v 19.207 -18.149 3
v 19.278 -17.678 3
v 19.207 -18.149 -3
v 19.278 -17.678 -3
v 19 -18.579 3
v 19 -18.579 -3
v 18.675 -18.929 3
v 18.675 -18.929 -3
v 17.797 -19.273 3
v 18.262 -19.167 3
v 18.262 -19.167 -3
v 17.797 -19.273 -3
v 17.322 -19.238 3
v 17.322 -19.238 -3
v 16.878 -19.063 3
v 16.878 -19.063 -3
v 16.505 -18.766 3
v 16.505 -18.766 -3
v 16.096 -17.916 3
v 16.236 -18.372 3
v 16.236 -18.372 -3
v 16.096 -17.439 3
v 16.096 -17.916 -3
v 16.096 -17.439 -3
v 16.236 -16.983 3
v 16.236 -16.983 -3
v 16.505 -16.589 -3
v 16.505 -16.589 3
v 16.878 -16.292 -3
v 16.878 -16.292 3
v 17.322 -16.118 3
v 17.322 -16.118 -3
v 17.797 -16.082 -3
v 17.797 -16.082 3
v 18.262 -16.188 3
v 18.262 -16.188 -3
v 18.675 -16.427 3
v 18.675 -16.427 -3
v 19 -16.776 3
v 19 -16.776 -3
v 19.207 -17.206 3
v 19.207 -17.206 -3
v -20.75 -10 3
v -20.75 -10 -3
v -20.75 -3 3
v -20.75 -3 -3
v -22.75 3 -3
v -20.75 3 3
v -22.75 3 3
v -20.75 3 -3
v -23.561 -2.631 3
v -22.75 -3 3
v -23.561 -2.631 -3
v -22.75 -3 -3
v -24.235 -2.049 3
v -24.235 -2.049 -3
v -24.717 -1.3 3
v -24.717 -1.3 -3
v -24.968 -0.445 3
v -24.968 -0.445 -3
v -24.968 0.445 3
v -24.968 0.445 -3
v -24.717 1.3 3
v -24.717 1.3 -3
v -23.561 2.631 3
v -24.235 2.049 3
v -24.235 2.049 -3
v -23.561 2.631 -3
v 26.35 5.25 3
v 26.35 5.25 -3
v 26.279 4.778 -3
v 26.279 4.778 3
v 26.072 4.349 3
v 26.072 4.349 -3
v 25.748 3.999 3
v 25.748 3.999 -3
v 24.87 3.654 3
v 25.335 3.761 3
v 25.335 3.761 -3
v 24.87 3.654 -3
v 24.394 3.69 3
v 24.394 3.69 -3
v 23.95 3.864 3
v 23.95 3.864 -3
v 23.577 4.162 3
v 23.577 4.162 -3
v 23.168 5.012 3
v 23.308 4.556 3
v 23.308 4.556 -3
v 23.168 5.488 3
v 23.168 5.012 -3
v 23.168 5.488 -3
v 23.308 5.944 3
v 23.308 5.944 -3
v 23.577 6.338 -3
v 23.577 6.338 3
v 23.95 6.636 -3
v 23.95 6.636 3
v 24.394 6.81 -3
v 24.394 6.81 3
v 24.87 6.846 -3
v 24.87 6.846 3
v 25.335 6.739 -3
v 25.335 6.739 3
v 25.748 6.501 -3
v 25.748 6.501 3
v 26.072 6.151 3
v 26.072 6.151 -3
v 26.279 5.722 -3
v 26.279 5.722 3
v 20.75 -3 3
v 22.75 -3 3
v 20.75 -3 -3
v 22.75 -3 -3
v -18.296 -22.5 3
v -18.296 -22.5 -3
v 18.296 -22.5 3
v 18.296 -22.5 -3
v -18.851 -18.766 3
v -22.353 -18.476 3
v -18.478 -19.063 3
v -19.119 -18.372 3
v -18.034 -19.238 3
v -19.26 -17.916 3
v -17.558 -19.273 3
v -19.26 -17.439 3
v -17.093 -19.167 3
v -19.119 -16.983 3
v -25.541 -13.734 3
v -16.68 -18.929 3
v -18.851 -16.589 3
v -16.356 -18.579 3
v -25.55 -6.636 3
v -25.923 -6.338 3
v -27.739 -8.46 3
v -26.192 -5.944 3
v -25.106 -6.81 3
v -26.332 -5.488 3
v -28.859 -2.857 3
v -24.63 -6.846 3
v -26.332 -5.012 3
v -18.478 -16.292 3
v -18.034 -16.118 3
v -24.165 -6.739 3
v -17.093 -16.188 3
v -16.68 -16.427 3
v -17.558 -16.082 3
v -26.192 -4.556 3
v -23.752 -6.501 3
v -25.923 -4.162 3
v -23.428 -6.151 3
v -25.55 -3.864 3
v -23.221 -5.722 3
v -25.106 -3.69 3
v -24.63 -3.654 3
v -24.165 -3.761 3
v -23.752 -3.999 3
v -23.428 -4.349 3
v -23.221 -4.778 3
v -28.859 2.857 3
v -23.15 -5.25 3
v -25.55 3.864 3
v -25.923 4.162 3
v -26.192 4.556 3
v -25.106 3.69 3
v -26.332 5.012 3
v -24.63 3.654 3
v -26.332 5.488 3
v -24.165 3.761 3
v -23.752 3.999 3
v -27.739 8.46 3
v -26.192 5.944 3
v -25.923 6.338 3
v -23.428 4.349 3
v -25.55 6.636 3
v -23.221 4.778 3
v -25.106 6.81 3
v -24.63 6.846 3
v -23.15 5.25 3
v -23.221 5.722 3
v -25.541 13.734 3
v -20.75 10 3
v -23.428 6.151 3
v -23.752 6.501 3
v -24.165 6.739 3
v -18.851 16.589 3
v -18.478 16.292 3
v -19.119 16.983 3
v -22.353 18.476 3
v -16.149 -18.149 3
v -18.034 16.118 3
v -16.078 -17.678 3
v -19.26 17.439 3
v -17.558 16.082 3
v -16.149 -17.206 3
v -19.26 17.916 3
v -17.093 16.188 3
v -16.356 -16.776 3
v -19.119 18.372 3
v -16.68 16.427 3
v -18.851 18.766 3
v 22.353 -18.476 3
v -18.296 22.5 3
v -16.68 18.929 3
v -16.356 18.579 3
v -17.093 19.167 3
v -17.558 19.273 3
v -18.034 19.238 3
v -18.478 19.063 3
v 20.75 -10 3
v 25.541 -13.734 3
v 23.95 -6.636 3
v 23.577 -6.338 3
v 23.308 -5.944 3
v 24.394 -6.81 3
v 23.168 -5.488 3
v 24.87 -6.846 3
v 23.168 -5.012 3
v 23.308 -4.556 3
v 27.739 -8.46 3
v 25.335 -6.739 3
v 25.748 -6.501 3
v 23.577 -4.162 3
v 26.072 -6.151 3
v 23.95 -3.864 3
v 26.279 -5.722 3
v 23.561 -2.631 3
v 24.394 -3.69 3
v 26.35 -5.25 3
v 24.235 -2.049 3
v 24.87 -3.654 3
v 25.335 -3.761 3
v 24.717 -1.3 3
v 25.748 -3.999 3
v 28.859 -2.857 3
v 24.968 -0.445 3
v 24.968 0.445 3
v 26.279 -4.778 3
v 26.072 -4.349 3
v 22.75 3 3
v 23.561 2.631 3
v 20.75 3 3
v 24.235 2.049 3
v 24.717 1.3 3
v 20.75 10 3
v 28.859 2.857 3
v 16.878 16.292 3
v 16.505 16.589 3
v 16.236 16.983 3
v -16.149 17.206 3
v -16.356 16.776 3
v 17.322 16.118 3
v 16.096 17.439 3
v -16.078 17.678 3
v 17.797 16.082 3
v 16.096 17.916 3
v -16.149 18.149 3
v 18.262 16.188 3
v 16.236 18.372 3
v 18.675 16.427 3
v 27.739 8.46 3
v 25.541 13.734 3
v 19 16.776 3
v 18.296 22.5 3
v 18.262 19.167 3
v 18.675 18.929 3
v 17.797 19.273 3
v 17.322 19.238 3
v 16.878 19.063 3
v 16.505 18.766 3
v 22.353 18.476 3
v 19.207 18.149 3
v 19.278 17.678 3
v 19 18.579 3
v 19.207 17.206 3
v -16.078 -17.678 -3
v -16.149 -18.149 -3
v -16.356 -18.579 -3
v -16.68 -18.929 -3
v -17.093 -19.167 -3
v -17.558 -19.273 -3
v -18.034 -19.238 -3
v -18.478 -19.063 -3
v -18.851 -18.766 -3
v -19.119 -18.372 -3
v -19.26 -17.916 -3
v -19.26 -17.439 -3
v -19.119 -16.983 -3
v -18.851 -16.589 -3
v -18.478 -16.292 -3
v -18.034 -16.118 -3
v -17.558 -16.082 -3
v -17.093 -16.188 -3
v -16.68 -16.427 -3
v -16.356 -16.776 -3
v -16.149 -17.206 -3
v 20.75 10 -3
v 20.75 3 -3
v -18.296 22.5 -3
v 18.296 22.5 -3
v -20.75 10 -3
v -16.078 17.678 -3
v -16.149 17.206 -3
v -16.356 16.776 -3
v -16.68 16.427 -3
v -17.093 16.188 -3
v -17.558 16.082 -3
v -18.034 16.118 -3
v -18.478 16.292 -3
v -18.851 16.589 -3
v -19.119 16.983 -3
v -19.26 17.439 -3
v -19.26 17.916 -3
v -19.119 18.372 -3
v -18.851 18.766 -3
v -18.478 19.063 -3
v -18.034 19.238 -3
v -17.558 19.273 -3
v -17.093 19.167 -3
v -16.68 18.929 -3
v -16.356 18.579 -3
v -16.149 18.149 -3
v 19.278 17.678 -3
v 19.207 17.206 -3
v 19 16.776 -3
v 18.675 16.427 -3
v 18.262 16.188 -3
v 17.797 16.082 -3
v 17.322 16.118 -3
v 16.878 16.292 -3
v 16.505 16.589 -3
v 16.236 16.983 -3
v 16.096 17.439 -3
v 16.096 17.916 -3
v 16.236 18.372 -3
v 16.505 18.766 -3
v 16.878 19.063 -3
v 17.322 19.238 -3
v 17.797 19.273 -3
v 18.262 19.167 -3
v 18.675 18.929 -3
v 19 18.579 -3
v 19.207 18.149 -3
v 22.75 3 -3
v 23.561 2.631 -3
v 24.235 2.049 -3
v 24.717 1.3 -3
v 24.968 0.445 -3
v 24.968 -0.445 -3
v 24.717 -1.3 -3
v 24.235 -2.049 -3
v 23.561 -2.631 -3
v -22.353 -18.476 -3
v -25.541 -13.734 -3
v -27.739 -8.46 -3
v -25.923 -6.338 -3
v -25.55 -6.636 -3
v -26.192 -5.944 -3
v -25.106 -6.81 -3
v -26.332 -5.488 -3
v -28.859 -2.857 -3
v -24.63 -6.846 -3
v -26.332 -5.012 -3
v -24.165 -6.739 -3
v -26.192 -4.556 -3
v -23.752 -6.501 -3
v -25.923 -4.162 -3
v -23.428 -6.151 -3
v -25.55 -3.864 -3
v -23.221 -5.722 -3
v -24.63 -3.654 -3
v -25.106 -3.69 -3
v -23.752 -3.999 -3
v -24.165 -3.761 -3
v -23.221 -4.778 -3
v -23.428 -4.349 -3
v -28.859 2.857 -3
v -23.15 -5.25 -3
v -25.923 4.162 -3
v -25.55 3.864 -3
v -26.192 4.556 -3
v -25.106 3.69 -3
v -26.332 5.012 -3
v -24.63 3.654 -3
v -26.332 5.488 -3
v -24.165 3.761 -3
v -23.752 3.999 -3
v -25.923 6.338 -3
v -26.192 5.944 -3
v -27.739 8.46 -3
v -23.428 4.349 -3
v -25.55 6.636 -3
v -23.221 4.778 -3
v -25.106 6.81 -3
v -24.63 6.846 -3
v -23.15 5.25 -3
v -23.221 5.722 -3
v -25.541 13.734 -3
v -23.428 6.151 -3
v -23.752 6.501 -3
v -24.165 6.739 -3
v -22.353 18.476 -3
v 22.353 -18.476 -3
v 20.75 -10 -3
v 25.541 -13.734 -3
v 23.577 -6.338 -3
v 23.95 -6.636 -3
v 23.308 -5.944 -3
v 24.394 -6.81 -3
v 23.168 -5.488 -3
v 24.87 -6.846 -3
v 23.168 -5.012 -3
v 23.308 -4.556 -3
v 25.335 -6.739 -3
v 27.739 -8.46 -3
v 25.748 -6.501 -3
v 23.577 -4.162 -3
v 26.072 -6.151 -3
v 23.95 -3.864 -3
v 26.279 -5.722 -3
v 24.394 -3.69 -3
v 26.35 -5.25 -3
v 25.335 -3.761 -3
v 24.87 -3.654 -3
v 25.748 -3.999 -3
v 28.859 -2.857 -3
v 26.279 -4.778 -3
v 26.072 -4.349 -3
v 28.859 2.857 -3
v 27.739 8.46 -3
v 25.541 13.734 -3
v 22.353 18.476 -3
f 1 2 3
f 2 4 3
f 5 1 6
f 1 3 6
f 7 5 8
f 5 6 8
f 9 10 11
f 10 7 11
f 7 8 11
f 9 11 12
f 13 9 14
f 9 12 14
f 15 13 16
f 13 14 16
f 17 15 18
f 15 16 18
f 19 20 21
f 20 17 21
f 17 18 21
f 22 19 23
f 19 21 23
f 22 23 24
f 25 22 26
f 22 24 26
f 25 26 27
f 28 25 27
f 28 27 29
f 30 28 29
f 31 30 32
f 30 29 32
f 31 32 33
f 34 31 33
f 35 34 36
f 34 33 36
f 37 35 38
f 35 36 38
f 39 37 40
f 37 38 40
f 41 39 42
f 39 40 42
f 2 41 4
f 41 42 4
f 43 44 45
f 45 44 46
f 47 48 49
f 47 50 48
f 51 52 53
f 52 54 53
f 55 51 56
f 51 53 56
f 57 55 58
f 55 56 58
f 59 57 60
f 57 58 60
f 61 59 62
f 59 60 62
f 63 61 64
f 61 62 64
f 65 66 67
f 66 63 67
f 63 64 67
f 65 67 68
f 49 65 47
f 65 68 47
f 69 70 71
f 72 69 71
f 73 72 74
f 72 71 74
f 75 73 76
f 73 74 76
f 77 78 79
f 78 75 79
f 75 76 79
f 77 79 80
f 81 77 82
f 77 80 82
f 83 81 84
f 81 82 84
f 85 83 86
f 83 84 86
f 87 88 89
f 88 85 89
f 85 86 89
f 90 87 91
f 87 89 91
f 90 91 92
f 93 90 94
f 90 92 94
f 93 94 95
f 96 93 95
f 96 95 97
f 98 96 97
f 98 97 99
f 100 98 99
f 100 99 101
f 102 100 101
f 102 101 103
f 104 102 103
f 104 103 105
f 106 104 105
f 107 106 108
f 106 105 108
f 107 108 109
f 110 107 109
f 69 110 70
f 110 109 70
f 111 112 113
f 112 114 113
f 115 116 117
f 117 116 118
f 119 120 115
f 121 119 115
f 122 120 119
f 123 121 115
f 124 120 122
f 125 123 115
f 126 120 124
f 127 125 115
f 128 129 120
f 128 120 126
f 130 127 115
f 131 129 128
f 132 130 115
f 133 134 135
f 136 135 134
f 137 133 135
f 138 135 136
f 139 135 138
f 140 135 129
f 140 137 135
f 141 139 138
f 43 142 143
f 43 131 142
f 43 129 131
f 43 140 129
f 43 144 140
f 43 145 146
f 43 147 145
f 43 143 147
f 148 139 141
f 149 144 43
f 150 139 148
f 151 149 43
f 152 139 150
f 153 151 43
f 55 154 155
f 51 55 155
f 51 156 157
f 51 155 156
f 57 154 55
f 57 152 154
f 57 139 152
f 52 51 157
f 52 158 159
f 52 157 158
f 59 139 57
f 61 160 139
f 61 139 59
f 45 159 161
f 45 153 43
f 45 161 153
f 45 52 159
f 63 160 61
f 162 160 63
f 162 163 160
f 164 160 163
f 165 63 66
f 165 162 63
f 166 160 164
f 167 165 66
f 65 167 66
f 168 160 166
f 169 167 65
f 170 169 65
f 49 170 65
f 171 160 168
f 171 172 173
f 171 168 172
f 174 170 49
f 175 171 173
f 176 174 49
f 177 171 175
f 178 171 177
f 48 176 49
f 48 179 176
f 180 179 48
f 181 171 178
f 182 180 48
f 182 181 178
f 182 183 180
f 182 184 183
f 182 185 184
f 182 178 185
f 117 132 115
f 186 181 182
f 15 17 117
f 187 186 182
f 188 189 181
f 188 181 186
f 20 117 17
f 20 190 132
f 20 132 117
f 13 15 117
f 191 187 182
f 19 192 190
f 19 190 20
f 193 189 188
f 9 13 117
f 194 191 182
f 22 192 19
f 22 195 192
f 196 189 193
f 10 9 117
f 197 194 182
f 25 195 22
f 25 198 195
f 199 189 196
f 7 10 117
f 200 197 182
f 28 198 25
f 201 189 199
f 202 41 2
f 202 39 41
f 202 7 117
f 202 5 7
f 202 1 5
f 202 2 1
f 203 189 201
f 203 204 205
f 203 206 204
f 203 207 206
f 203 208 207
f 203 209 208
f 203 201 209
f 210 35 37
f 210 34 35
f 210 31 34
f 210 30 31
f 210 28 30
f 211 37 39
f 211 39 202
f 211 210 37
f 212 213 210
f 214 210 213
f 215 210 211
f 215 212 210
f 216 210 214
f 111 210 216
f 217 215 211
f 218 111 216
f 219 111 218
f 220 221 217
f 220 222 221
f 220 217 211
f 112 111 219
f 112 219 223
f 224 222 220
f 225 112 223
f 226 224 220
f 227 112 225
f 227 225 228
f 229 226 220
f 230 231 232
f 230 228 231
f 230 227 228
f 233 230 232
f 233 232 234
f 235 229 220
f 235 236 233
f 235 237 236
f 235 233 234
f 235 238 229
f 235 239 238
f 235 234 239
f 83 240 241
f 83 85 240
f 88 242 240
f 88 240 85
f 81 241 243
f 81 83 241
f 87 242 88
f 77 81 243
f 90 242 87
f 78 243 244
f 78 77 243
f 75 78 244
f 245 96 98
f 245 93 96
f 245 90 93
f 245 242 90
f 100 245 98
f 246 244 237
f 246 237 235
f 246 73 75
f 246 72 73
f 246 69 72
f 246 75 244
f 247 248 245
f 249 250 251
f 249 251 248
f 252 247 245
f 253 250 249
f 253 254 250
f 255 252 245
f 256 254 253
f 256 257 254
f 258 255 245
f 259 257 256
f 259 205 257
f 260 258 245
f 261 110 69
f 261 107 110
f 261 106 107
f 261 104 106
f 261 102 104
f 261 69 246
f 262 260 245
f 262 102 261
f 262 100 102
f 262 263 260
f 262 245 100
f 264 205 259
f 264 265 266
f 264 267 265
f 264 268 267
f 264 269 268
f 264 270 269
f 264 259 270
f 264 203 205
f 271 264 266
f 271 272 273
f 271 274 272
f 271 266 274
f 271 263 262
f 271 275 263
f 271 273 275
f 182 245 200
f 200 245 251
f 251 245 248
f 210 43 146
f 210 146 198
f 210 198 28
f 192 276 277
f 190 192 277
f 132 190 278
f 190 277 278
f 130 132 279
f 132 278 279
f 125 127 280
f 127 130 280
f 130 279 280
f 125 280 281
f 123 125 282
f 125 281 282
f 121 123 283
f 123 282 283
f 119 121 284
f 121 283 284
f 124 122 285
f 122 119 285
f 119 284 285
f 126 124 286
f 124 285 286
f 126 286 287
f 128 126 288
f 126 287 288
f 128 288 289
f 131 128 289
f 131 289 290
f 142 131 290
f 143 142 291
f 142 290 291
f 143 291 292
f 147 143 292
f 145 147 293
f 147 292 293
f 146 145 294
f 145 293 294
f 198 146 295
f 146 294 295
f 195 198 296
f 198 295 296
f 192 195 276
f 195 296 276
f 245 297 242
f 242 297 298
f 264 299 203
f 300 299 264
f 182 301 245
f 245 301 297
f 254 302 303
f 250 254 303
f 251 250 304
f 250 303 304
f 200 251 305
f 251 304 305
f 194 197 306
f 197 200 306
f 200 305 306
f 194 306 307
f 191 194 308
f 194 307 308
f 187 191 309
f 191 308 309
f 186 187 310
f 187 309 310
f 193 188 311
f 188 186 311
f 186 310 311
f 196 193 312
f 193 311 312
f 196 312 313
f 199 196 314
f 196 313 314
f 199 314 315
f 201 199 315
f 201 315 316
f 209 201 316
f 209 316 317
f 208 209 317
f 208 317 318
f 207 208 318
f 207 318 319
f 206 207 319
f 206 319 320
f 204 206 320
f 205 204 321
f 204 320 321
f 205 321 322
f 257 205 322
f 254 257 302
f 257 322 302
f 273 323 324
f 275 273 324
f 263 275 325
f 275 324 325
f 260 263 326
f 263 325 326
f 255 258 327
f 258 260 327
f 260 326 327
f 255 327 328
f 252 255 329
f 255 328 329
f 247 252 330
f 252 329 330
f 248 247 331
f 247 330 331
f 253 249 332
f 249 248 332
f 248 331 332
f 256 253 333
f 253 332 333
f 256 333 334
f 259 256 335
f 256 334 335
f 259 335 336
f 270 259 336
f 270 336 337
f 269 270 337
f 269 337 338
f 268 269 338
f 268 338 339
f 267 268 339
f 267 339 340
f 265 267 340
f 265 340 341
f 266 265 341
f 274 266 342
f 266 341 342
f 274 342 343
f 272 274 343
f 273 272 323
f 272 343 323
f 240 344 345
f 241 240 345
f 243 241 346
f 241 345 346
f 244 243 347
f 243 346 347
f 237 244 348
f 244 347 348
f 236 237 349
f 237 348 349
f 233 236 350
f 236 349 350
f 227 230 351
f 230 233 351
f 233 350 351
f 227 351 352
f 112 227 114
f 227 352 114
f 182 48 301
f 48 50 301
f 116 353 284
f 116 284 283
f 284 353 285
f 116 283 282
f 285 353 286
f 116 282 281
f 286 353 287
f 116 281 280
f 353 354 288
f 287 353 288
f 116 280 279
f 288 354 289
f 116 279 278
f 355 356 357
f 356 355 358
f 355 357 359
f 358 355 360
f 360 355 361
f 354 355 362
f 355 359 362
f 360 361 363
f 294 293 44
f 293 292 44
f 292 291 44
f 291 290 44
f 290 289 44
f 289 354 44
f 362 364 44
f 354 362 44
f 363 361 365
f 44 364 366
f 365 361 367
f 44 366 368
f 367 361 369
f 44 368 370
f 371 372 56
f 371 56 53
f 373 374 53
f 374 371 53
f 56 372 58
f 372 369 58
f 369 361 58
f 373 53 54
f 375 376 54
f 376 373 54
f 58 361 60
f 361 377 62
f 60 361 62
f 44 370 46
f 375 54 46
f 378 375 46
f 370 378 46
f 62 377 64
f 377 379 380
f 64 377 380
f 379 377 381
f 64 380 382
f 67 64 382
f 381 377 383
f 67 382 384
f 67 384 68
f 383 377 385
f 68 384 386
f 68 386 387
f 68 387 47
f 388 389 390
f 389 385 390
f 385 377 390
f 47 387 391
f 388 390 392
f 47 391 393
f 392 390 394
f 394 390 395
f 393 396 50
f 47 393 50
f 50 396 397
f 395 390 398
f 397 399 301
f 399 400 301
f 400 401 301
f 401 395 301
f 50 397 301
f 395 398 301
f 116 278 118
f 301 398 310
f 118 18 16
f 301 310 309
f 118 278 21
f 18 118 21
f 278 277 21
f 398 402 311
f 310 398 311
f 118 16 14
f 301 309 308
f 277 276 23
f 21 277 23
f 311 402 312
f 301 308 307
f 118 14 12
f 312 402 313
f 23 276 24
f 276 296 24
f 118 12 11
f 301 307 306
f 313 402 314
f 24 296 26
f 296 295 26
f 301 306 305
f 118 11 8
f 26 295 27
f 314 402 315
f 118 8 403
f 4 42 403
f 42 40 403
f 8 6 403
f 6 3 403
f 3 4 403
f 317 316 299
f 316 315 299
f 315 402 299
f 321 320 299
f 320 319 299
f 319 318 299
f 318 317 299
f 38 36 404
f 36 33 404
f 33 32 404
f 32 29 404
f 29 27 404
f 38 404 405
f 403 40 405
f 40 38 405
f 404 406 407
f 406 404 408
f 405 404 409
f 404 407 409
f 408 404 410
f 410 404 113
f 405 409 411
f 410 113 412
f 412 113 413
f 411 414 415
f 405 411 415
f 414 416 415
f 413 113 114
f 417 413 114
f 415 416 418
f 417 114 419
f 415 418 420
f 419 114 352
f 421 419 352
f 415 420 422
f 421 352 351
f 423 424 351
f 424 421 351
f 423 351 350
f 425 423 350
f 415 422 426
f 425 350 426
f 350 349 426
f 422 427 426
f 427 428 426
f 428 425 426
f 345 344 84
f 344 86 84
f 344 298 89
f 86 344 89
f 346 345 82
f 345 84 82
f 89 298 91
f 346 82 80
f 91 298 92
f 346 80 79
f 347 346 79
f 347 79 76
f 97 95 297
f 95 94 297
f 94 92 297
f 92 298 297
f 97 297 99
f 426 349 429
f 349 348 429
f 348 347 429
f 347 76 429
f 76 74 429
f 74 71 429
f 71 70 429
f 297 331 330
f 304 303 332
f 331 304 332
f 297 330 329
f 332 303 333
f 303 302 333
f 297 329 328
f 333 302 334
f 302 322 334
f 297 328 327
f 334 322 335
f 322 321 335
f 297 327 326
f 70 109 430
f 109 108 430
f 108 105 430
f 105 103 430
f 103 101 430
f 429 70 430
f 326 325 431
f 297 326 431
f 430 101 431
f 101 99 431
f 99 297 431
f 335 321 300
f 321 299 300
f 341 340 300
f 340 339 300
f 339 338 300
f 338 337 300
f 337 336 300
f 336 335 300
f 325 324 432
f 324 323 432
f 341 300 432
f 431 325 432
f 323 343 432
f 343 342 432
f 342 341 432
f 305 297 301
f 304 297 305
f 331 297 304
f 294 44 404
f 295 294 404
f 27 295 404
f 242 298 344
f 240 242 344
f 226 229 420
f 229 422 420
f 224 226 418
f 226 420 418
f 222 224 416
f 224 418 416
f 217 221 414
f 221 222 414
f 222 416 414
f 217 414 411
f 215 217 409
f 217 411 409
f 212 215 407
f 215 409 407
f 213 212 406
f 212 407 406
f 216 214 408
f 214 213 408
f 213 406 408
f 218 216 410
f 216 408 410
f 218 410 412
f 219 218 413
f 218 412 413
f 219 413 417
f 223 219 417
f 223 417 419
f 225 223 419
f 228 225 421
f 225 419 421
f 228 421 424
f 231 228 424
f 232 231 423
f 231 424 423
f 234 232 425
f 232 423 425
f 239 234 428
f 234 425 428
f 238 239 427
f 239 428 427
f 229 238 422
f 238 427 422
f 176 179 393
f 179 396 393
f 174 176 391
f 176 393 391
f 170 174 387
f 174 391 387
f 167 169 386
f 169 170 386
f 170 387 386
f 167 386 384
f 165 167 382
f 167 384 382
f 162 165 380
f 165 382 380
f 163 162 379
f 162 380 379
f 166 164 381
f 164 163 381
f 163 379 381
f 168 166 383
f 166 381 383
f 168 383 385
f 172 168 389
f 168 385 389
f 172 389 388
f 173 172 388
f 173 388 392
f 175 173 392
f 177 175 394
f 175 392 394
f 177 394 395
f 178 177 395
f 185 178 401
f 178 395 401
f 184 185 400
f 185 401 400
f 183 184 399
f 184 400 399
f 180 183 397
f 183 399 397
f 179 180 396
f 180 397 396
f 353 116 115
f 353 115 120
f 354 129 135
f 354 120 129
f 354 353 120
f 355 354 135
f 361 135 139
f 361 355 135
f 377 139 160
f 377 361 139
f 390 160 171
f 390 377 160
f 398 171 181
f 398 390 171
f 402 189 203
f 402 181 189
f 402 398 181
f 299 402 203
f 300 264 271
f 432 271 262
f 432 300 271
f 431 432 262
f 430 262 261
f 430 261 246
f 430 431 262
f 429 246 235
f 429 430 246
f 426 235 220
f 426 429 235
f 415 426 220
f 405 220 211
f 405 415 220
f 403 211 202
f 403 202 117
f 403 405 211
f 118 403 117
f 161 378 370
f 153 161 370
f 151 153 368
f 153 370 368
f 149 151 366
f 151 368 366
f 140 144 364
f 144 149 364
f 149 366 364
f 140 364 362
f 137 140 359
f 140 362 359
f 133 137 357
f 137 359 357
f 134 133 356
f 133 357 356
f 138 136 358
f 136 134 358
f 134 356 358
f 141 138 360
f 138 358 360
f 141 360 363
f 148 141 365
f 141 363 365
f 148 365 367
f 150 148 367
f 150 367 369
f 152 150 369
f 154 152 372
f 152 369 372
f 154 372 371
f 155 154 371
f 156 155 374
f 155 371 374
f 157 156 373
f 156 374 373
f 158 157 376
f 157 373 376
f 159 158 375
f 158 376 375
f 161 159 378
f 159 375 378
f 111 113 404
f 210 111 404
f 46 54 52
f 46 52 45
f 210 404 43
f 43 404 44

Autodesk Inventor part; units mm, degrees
ref_plane "YZ Plane" through (0, 0, 0) normal (1, 0, 0) x (0, 1, 0)
ref_plane "XZ Plane" through (0, 0, 0) normal (0, 1, 0) x (-1, 0, 0)
ref_plane "XY Plane" through (0, 0, 0) normal (0, 0, 1) x (1, 0, 0)
sketch "Эскиз1" plane through (0, 0, 0) normal (0, 0, 1) x (1, 0, 0)
  line L0 (-20.75, 10) -> (20.75, 10)
  line L1 (20.75, 10) -> (20.75, -10)
  line L2 (20.75, -10) -> (-20.75, -10)
  line L3 (-20.75, -10) -> (-20.75, 10)
  line L4 (-20.75, 10) -> (20.75, -10) construction
  line L5 (20.75, 10) -> (-20.75, -10) construction
  circle A0 centre (0, 0) radius 29
  line L6 (0, 0) -> (0, 105.5742) construction
  line L7 (0, 0) -> (104.4464, 0) construction
  circle A1 centre (0, 0) radius 25 construction
  line L8 (0, 0) -> (29.0219, 29.0219) construction
  circle A2 centre (17.6777, 17.6777) radius 1.6
  line L9 (0, 0) -> (-29.0219, 29.0219) construction
  circle A3 centre (-17.6777, 17.6777) radius 1.6
  line L10 (0, 0) -> (-29.0219, -29.0219) construction
  circle A4 centre (-17.6777, -17.6777) radius 1.6
  line L11 (0, 0) -> (29.0219, -29.0219) construction
  circle A5 centre (17.6777, -17.6777) radius 1.6
  circle A6 centre (-24.75, -5.25) radius 1.6
  circle A7 centre (-24.75, 5.25) radius 1.6
  circle A8 centre (24.75, -5.25) radius 1.6
  circle A9 centre (24.75, 5.25) radius 1.6
  line L12 (20.75, 3) -> (22.75, 3)
  line L13 (22.75, 3) -> (22.75, -3)
  line L14 (22.75, -3) -> (20.75, -3)
  line L15 (20.75, -3) -> (20.75, 3)
  line L16 (-20.75, 3) -> (-22.75, 3)
  line L17 (-22.75, 3) -> (-22.75, -3)
  line L18 (-22.75, -3) -> (-20.75, -3)
  line L19 (-20.75, -3) -> (-20.75, 3)
  line L20 (-18.2962, -22.5) -> (18.2962, -22.5)
  line L21 (-18.2962, 22.5) -> (18.2962, 22.5)
  arc A10 (22.75, -3) -> (22.75, 3) centre (21.875, 0) ccw
  arc A11 (-22.75, 3) -> (-22.75, -3) centre (-21.875, 0) ccw
  point P0 (-20.75, -3)
  point P1 (-20.75, 3)
  dimension "d18" = 50
  dimension "d0" = 41.5
  dimension "d1" = 20
  dimension "d8" = 58
  dimension "d17" = 45
  dimension "d19" = 3.2
  dimension "d22" = 360
  dimension "d24" = 3.2
  dimension "d25" = 4.75
  dimension "d26" = 4
  dimension "d29" = 4.75
  dimension "d31" = 2
  dimension "d32" = 6
  dimension "d33" = 2
  dimension "d34" = 45
extrude "Выдавливание1" add sketch "Эскиз1" along normal mid plane 6 contours A0 L20 L21
properties part number "Кронштейн_сервопривод"
